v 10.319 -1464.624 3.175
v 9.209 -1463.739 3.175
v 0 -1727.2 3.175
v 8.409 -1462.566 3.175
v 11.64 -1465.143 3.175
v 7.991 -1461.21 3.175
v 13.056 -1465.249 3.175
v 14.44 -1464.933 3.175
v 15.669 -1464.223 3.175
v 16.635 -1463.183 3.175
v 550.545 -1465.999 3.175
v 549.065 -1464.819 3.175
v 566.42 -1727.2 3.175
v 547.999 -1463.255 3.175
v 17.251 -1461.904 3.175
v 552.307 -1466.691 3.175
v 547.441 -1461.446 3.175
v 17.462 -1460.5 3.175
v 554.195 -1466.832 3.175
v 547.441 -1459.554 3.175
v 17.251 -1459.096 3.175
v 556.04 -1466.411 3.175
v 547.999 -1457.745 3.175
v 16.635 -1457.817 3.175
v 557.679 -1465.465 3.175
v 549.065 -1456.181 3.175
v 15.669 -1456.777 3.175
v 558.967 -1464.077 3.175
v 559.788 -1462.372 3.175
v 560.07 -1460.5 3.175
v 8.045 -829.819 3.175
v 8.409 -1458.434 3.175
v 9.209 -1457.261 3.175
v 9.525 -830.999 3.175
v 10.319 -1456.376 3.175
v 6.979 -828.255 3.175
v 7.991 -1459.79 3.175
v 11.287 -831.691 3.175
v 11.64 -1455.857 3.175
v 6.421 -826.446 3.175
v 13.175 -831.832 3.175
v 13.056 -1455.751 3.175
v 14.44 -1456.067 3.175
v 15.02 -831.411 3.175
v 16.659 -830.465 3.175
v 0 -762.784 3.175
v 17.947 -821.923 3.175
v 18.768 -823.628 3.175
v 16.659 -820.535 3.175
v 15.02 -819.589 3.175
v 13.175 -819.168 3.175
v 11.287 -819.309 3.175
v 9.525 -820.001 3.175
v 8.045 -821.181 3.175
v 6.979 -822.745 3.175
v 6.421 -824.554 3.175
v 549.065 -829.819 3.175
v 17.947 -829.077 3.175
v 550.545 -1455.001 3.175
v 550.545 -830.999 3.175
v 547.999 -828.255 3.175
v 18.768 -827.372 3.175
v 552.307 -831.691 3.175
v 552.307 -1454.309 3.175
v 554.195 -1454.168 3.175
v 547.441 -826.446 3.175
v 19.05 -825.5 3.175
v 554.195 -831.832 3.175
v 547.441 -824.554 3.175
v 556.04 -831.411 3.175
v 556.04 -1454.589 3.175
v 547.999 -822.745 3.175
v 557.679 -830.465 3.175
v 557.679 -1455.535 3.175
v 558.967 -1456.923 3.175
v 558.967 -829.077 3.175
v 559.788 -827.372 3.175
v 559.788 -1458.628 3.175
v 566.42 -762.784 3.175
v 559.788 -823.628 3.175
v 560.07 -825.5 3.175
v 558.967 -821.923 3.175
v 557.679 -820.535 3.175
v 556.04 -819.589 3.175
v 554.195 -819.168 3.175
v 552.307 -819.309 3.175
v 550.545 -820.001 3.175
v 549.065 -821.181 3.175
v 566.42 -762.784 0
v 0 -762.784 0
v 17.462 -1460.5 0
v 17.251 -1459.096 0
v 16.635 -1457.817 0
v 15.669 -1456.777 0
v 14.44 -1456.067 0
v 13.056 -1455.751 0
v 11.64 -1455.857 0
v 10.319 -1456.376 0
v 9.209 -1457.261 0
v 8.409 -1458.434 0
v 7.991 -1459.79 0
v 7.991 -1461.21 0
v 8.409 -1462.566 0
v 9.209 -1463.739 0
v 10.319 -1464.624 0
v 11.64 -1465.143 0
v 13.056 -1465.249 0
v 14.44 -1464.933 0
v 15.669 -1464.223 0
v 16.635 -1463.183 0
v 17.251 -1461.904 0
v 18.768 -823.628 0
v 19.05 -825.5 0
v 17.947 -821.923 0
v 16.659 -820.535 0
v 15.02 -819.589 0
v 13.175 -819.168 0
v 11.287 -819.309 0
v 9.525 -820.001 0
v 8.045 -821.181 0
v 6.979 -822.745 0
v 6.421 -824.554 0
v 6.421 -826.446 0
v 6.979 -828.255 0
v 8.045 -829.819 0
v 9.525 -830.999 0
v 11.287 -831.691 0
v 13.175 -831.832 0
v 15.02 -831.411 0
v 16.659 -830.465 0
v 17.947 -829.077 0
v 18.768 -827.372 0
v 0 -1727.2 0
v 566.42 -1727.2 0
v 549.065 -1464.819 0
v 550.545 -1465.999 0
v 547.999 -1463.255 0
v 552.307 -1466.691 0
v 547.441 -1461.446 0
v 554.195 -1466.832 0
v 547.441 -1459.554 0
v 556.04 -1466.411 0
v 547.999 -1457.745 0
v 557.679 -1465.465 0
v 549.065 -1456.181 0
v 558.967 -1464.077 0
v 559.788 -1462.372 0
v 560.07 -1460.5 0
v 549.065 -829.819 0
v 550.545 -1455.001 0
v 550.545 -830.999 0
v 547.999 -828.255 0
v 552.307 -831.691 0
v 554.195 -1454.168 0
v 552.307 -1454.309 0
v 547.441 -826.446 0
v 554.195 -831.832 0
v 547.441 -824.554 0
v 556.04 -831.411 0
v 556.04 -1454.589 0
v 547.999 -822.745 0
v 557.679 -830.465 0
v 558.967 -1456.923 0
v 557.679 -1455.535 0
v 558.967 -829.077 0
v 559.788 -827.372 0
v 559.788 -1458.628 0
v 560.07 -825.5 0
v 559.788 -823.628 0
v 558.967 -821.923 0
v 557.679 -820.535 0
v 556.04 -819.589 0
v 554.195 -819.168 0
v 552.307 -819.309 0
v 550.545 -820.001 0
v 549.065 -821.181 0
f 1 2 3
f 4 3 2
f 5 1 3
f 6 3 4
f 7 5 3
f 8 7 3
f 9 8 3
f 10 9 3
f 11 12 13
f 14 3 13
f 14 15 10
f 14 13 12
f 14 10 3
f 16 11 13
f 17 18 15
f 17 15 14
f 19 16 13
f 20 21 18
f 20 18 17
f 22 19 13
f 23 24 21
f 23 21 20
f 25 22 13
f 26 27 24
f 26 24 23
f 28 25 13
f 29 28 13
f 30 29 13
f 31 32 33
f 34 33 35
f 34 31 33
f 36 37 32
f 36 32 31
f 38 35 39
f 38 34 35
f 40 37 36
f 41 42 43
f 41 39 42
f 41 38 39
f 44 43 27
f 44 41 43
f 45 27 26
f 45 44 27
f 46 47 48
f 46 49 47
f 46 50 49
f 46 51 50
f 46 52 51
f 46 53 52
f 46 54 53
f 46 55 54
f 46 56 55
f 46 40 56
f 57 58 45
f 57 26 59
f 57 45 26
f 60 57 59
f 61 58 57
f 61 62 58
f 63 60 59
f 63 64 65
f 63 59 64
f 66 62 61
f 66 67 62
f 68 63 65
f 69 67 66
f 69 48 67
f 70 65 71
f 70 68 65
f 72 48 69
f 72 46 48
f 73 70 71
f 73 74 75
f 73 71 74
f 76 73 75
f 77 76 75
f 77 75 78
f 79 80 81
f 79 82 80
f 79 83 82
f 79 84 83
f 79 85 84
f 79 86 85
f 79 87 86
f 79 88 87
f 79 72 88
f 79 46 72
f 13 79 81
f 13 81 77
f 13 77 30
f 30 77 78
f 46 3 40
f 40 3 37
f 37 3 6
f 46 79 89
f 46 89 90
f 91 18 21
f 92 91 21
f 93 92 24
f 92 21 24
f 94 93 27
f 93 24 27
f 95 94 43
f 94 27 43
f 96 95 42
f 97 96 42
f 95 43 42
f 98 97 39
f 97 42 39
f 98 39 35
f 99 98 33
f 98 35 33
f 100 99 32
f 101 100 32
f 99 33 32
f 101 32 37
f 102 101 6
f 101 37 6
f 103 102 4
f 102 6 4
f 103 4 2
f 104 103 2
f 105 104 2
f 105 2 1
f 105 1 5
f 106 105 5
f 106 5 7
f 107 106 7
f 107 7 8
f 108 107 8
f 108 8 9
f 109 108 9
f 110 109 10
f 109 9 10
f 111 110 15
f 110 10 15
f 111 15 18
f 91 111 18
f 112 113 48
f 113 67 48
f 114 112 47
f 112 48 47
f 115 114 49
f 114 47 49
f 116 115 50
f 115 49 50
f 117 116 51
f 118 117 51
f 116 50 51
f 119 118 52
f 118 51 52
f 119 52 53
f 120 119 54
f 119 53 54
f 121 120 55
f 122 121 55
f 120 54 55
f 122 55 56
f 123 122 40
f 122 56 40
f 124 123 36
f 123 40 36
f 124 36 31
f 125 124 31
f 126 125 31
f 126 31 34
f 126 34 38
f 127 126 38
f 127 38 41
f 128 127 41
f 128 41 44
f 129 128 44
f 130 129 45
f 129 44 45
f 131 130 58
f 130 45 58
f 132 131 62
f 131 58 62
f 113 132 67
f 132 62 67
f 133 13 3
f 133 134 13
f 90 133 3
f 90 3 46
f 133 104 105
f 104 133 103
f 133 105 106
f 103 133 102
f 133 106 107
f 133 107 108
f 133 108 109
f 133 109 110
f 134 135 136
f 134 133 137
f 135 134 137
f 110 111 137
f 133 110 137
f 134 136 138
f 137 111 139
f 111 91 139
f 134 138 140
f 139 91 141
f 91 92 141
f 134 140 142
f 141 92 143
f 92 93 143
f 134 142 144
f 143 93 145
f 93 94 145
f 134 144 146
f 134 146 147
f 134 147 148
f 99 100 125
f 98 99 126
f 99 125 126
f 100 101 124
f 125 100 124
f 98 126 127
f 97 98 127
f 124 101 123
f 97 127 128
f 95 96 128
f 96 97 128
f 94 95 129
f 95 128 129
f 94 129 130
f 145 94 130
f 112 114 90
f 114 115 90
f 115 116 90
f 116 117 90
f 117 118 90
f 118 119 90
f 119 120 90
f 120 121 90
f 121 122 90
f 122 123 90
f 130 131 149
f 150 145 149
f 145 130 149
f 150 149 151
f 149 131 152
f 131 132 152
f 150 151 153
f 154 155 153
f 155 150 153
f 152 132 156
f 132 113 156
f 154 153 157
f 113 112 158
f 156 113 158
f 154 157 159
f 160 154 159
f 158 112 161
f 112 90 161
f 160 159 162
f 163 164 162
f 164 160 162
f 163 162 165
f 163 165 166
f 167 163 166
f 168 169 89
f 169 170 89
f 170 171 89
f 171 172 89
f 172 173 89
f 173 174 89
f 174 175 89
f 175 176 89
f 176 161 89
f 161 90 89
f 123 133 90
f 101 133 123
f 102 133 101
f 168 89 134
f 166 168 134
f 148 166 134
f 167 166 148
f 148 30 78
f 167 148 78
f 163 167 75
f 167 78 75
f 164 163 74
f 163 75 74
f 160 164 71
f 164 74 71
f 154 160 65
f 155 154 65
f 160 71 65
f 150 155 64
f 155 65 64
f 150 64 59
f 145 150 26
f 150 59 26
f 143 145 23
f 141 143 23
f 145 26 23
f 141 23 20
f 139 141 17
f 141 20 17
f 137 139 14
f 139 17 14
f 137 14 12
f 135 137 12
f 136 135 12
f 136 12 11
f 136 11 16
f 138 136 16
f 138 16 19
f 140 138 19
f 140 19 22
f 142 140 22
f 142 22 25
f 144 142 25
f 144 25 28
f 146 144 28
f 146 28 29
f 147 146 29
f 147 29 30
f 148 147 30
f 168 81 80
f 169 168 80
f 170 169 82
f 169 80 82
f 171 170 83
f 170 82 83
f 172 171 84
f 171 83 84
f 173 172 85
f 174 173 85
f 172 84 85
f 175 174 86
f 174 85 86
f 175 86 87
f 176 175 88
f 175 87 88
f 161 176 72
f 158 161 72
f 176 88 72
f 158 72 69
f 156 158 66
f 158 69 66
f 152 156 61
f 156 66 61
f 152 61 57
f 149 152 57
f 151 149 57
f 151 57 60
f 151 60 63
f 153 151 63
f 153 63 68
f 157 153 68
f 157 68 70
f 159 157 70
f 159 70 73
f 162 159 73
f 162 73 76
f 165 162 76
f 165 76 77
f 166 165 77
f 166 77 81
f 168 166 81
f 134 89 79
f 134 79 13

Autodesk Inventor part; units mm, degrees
ref_plane "YZ Plane" through (0, 0, 0) normal (1, 0, 0) x (0, 1, 0)
ref_plane "XZ Plane" through (0, 0, 0) normal (0, 1, 0) x (-1, 0, 0)
ref_plane "XY Plane" through (0, 0, 0) normal (0, 0, 1) x (1, 0, 0)
sketch "Sketch2" plane through (0, 0, 0) normal (0, 0, 1) x (1, 0, 0)
  line L0 (0, 0) -> (566.42, 0)
  line L1 (566.42, 0) -> (566.42, -1727.2)
  line L2 (566.42, -1727.2) -> (0, -1727.2)
  line L3 (0, -1727.2) -> (0, 0)
  dimension "d0" = 566.42
  dimension "d1" = 1727.2
extrude "Extrusion1" add sketch "Sketch2" along normal blind 3.175
sketch "Sketch4" plane through (0, 0, 3.175) normal (0, 0, 1) x (1, 0, 0)
  line L0 (566.42, 0) -> (0, 0) projected
  line L1 (0, 0) -> (0, -1727.2) projected
  line L2 (0, -1727.2) -> (566.42, -1727.2) projected
  line L3 (566.42, -1727.2) -> (566.42, 0) projected
  line L4 (0, -1727.2) -> (566.42, -1727.2) projected
  line L5 (68.58, -1727.2) -> (500.38, -1727.2)
  circle A0 centre (68.58, -1391.92) radius 12.7
  circle A1 centre (500.38, -1391.92) radius 12.7
  circle A2 centre (68.58, -1727.2) radius 12.7
  circle A3 centre (500.38, -1727.2) radius 12.7
  dimension "d6" = 25.4
  dimension "d7" = 25.4
  dimension "d8" = 25.4
  dimension "d9" = 25.4
extrude "Extrusion2" add sketch "Sketch4" along normal blind 3.175 contours A0 | A1
sketch "Sketch6" plane through (0, 0, 3.175) normal (0, 0, 1) x (1, 0, 0)
  circle A0 centre (12.7, -1460.5) radius 3.175 projected
  circle A1 centre (553.72, -1460.5) radius 3.175 projected
  circle A2 centre (553.72, -1460.5) radius 4.7625
  circle A3 centre (12.7, -1460.5) radius 4.7625
  point P0 (0, 0)
  dimension "d16" = 9.525
  dimension "d17" = 9.525
extrude "Extrusion4" cut sketch "Sketch6" against normal through all contours A0 | A1 | A2 | A3
sketch "Sketch7" plane through (0, 0, 3.175) normal (0, 0, 1) x (1, 0, 0)
  circle A0 centre (12.7, -1460.5) radius 4.7625 projected
  circle A1 centre (12.7, -1460.5) radius 6.35
  circle A2 centre (553.72, -1460.5) radius 4.7625 projected
  circle A3 centre (553.72, -1460.5) radius 6.35
  point P0 (0, 0)
  dimension "d20" = 12.7
  dimension "d21" = 12.7
extrude "Extrusion5" cut sketch "Sketch7" against normal blind 12.7 contours A3
sketch "Sketch9" plane through (0, 0, 3.175) normal (0, 0, 1) x (1, 0, 0)
  circle A0 centre (553.72, -825.5) radius 6.35 projected
  circle A1 centre (12.7, -825.5) radius 6.35 projected
  circle A2 centre (12.7, -825.5) radius 6.35
  circle A3 centre (553.72, -825.5) radius 6.35
  point P0 (0, 0)
extrude "Extrusion7" cut sketch "Sketch9" against normal blind 3.175
sketch "Sketch10" plane through (0, 0, 3.175) normal (0, 0, 1) x (1, 0, 0)
  line L0 (566.42, 0) -> (566.42, -1727.2) projected
  line L1 (0, -1732.8892) -> (566.42, -1732.8892)
  line L2 (566.42, -1732.8892) -> (566.42, -1054.0894)
  line L3 (566.42, -1054.0894) -> (0, -1054.0894)
  line L4 (0, -1054.0894) -> (0, -1732.8892)
  point P0 (0, 0)
extrude "Extrusion8" cut sketch "Sketch10" along normal blind 25.4
sketch "Sketch13" plane through (0, 0, 3.175) normal (0, 0, 1) x (1, 0, 0)
  line L0 (566.42, -1727.2) -> (566.42, 0) projected
  line L1 (0, -1727.2) -> (566.42, -1727.2)
  line L2 (566.42, -1727.2) -> (566.42, -762.784)
  line L3 (566.42, -762.784) -> (0, -762.784)
  line L4 (0, -762.784) -> (0, -1727.2)
  line L5 (0, -762.784) -> (566.42, -762.784)
  line L6 (566.42, -762.784) -> (566.42, 0)
  line L7 (566.42, 0) -> (0, 0)
  line L8 (0, 0) -> (0, -762.784)
extrude "Extrusion10" cut sketch "Sketch13" against normal blind 25.4 contours L3 L8 L7 L0
equation "\"d22\" = d20"
properties part number "Electronics plate top"
